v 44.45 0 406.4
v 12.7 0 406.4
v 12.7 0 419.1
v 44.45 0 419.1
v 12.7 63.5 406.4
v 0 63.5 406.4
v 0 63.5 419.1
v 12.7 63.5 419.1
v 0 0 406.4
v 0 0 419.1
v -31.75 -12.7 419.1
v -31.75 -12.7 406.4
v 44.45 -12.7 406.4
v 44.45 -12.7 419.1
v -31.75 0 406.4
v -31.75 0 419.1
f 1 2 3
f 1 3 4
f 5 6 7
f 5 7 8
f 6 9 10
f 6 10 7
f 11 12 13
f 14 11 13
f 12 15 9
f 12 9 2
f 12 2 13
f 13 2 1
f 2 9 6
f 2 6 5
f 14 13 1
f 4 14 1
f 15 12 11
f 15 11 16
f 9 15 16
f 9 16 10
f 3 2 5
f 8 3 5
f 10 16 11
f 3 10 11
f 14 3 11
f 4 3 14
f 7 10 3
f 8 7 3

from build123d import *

# Parameters (mm, degrees)
BOX001_W     = 12.7
BOX001_H     = 63.5
BOX001_DEPTH = 12.7
BOX002_W     = 76.2
BOX002_H     = 12.7
BOX002_DEPTH = 12.7


with BuildPart() as cube:
    # Box001 → Box001 (new body)
    with BuildSketch(Plane.XY.offset(406.4)):
        with Locations((6.35, 31.75)):
            Rectangle(BOX001_W, BOX001_H)
    extrude(amount=BOX001_DEPTH)


with BuildPart() as fusion:
    # Box002 → Box002 (new body)
    with BuildSketch(Plane(origin=(-31.75, -12.7, 406.4), x_dir=(1, 0, 0), z_dir=(0, 0, 1))):
        with Locations((38.1, 6.35)):
            Rectangle(BOX002_W, BOX002_H)
    extrude(amount=BOX002_DEPTH)

    # Fusion: union Cube
    add(cube.part)


solid = fusion.part
